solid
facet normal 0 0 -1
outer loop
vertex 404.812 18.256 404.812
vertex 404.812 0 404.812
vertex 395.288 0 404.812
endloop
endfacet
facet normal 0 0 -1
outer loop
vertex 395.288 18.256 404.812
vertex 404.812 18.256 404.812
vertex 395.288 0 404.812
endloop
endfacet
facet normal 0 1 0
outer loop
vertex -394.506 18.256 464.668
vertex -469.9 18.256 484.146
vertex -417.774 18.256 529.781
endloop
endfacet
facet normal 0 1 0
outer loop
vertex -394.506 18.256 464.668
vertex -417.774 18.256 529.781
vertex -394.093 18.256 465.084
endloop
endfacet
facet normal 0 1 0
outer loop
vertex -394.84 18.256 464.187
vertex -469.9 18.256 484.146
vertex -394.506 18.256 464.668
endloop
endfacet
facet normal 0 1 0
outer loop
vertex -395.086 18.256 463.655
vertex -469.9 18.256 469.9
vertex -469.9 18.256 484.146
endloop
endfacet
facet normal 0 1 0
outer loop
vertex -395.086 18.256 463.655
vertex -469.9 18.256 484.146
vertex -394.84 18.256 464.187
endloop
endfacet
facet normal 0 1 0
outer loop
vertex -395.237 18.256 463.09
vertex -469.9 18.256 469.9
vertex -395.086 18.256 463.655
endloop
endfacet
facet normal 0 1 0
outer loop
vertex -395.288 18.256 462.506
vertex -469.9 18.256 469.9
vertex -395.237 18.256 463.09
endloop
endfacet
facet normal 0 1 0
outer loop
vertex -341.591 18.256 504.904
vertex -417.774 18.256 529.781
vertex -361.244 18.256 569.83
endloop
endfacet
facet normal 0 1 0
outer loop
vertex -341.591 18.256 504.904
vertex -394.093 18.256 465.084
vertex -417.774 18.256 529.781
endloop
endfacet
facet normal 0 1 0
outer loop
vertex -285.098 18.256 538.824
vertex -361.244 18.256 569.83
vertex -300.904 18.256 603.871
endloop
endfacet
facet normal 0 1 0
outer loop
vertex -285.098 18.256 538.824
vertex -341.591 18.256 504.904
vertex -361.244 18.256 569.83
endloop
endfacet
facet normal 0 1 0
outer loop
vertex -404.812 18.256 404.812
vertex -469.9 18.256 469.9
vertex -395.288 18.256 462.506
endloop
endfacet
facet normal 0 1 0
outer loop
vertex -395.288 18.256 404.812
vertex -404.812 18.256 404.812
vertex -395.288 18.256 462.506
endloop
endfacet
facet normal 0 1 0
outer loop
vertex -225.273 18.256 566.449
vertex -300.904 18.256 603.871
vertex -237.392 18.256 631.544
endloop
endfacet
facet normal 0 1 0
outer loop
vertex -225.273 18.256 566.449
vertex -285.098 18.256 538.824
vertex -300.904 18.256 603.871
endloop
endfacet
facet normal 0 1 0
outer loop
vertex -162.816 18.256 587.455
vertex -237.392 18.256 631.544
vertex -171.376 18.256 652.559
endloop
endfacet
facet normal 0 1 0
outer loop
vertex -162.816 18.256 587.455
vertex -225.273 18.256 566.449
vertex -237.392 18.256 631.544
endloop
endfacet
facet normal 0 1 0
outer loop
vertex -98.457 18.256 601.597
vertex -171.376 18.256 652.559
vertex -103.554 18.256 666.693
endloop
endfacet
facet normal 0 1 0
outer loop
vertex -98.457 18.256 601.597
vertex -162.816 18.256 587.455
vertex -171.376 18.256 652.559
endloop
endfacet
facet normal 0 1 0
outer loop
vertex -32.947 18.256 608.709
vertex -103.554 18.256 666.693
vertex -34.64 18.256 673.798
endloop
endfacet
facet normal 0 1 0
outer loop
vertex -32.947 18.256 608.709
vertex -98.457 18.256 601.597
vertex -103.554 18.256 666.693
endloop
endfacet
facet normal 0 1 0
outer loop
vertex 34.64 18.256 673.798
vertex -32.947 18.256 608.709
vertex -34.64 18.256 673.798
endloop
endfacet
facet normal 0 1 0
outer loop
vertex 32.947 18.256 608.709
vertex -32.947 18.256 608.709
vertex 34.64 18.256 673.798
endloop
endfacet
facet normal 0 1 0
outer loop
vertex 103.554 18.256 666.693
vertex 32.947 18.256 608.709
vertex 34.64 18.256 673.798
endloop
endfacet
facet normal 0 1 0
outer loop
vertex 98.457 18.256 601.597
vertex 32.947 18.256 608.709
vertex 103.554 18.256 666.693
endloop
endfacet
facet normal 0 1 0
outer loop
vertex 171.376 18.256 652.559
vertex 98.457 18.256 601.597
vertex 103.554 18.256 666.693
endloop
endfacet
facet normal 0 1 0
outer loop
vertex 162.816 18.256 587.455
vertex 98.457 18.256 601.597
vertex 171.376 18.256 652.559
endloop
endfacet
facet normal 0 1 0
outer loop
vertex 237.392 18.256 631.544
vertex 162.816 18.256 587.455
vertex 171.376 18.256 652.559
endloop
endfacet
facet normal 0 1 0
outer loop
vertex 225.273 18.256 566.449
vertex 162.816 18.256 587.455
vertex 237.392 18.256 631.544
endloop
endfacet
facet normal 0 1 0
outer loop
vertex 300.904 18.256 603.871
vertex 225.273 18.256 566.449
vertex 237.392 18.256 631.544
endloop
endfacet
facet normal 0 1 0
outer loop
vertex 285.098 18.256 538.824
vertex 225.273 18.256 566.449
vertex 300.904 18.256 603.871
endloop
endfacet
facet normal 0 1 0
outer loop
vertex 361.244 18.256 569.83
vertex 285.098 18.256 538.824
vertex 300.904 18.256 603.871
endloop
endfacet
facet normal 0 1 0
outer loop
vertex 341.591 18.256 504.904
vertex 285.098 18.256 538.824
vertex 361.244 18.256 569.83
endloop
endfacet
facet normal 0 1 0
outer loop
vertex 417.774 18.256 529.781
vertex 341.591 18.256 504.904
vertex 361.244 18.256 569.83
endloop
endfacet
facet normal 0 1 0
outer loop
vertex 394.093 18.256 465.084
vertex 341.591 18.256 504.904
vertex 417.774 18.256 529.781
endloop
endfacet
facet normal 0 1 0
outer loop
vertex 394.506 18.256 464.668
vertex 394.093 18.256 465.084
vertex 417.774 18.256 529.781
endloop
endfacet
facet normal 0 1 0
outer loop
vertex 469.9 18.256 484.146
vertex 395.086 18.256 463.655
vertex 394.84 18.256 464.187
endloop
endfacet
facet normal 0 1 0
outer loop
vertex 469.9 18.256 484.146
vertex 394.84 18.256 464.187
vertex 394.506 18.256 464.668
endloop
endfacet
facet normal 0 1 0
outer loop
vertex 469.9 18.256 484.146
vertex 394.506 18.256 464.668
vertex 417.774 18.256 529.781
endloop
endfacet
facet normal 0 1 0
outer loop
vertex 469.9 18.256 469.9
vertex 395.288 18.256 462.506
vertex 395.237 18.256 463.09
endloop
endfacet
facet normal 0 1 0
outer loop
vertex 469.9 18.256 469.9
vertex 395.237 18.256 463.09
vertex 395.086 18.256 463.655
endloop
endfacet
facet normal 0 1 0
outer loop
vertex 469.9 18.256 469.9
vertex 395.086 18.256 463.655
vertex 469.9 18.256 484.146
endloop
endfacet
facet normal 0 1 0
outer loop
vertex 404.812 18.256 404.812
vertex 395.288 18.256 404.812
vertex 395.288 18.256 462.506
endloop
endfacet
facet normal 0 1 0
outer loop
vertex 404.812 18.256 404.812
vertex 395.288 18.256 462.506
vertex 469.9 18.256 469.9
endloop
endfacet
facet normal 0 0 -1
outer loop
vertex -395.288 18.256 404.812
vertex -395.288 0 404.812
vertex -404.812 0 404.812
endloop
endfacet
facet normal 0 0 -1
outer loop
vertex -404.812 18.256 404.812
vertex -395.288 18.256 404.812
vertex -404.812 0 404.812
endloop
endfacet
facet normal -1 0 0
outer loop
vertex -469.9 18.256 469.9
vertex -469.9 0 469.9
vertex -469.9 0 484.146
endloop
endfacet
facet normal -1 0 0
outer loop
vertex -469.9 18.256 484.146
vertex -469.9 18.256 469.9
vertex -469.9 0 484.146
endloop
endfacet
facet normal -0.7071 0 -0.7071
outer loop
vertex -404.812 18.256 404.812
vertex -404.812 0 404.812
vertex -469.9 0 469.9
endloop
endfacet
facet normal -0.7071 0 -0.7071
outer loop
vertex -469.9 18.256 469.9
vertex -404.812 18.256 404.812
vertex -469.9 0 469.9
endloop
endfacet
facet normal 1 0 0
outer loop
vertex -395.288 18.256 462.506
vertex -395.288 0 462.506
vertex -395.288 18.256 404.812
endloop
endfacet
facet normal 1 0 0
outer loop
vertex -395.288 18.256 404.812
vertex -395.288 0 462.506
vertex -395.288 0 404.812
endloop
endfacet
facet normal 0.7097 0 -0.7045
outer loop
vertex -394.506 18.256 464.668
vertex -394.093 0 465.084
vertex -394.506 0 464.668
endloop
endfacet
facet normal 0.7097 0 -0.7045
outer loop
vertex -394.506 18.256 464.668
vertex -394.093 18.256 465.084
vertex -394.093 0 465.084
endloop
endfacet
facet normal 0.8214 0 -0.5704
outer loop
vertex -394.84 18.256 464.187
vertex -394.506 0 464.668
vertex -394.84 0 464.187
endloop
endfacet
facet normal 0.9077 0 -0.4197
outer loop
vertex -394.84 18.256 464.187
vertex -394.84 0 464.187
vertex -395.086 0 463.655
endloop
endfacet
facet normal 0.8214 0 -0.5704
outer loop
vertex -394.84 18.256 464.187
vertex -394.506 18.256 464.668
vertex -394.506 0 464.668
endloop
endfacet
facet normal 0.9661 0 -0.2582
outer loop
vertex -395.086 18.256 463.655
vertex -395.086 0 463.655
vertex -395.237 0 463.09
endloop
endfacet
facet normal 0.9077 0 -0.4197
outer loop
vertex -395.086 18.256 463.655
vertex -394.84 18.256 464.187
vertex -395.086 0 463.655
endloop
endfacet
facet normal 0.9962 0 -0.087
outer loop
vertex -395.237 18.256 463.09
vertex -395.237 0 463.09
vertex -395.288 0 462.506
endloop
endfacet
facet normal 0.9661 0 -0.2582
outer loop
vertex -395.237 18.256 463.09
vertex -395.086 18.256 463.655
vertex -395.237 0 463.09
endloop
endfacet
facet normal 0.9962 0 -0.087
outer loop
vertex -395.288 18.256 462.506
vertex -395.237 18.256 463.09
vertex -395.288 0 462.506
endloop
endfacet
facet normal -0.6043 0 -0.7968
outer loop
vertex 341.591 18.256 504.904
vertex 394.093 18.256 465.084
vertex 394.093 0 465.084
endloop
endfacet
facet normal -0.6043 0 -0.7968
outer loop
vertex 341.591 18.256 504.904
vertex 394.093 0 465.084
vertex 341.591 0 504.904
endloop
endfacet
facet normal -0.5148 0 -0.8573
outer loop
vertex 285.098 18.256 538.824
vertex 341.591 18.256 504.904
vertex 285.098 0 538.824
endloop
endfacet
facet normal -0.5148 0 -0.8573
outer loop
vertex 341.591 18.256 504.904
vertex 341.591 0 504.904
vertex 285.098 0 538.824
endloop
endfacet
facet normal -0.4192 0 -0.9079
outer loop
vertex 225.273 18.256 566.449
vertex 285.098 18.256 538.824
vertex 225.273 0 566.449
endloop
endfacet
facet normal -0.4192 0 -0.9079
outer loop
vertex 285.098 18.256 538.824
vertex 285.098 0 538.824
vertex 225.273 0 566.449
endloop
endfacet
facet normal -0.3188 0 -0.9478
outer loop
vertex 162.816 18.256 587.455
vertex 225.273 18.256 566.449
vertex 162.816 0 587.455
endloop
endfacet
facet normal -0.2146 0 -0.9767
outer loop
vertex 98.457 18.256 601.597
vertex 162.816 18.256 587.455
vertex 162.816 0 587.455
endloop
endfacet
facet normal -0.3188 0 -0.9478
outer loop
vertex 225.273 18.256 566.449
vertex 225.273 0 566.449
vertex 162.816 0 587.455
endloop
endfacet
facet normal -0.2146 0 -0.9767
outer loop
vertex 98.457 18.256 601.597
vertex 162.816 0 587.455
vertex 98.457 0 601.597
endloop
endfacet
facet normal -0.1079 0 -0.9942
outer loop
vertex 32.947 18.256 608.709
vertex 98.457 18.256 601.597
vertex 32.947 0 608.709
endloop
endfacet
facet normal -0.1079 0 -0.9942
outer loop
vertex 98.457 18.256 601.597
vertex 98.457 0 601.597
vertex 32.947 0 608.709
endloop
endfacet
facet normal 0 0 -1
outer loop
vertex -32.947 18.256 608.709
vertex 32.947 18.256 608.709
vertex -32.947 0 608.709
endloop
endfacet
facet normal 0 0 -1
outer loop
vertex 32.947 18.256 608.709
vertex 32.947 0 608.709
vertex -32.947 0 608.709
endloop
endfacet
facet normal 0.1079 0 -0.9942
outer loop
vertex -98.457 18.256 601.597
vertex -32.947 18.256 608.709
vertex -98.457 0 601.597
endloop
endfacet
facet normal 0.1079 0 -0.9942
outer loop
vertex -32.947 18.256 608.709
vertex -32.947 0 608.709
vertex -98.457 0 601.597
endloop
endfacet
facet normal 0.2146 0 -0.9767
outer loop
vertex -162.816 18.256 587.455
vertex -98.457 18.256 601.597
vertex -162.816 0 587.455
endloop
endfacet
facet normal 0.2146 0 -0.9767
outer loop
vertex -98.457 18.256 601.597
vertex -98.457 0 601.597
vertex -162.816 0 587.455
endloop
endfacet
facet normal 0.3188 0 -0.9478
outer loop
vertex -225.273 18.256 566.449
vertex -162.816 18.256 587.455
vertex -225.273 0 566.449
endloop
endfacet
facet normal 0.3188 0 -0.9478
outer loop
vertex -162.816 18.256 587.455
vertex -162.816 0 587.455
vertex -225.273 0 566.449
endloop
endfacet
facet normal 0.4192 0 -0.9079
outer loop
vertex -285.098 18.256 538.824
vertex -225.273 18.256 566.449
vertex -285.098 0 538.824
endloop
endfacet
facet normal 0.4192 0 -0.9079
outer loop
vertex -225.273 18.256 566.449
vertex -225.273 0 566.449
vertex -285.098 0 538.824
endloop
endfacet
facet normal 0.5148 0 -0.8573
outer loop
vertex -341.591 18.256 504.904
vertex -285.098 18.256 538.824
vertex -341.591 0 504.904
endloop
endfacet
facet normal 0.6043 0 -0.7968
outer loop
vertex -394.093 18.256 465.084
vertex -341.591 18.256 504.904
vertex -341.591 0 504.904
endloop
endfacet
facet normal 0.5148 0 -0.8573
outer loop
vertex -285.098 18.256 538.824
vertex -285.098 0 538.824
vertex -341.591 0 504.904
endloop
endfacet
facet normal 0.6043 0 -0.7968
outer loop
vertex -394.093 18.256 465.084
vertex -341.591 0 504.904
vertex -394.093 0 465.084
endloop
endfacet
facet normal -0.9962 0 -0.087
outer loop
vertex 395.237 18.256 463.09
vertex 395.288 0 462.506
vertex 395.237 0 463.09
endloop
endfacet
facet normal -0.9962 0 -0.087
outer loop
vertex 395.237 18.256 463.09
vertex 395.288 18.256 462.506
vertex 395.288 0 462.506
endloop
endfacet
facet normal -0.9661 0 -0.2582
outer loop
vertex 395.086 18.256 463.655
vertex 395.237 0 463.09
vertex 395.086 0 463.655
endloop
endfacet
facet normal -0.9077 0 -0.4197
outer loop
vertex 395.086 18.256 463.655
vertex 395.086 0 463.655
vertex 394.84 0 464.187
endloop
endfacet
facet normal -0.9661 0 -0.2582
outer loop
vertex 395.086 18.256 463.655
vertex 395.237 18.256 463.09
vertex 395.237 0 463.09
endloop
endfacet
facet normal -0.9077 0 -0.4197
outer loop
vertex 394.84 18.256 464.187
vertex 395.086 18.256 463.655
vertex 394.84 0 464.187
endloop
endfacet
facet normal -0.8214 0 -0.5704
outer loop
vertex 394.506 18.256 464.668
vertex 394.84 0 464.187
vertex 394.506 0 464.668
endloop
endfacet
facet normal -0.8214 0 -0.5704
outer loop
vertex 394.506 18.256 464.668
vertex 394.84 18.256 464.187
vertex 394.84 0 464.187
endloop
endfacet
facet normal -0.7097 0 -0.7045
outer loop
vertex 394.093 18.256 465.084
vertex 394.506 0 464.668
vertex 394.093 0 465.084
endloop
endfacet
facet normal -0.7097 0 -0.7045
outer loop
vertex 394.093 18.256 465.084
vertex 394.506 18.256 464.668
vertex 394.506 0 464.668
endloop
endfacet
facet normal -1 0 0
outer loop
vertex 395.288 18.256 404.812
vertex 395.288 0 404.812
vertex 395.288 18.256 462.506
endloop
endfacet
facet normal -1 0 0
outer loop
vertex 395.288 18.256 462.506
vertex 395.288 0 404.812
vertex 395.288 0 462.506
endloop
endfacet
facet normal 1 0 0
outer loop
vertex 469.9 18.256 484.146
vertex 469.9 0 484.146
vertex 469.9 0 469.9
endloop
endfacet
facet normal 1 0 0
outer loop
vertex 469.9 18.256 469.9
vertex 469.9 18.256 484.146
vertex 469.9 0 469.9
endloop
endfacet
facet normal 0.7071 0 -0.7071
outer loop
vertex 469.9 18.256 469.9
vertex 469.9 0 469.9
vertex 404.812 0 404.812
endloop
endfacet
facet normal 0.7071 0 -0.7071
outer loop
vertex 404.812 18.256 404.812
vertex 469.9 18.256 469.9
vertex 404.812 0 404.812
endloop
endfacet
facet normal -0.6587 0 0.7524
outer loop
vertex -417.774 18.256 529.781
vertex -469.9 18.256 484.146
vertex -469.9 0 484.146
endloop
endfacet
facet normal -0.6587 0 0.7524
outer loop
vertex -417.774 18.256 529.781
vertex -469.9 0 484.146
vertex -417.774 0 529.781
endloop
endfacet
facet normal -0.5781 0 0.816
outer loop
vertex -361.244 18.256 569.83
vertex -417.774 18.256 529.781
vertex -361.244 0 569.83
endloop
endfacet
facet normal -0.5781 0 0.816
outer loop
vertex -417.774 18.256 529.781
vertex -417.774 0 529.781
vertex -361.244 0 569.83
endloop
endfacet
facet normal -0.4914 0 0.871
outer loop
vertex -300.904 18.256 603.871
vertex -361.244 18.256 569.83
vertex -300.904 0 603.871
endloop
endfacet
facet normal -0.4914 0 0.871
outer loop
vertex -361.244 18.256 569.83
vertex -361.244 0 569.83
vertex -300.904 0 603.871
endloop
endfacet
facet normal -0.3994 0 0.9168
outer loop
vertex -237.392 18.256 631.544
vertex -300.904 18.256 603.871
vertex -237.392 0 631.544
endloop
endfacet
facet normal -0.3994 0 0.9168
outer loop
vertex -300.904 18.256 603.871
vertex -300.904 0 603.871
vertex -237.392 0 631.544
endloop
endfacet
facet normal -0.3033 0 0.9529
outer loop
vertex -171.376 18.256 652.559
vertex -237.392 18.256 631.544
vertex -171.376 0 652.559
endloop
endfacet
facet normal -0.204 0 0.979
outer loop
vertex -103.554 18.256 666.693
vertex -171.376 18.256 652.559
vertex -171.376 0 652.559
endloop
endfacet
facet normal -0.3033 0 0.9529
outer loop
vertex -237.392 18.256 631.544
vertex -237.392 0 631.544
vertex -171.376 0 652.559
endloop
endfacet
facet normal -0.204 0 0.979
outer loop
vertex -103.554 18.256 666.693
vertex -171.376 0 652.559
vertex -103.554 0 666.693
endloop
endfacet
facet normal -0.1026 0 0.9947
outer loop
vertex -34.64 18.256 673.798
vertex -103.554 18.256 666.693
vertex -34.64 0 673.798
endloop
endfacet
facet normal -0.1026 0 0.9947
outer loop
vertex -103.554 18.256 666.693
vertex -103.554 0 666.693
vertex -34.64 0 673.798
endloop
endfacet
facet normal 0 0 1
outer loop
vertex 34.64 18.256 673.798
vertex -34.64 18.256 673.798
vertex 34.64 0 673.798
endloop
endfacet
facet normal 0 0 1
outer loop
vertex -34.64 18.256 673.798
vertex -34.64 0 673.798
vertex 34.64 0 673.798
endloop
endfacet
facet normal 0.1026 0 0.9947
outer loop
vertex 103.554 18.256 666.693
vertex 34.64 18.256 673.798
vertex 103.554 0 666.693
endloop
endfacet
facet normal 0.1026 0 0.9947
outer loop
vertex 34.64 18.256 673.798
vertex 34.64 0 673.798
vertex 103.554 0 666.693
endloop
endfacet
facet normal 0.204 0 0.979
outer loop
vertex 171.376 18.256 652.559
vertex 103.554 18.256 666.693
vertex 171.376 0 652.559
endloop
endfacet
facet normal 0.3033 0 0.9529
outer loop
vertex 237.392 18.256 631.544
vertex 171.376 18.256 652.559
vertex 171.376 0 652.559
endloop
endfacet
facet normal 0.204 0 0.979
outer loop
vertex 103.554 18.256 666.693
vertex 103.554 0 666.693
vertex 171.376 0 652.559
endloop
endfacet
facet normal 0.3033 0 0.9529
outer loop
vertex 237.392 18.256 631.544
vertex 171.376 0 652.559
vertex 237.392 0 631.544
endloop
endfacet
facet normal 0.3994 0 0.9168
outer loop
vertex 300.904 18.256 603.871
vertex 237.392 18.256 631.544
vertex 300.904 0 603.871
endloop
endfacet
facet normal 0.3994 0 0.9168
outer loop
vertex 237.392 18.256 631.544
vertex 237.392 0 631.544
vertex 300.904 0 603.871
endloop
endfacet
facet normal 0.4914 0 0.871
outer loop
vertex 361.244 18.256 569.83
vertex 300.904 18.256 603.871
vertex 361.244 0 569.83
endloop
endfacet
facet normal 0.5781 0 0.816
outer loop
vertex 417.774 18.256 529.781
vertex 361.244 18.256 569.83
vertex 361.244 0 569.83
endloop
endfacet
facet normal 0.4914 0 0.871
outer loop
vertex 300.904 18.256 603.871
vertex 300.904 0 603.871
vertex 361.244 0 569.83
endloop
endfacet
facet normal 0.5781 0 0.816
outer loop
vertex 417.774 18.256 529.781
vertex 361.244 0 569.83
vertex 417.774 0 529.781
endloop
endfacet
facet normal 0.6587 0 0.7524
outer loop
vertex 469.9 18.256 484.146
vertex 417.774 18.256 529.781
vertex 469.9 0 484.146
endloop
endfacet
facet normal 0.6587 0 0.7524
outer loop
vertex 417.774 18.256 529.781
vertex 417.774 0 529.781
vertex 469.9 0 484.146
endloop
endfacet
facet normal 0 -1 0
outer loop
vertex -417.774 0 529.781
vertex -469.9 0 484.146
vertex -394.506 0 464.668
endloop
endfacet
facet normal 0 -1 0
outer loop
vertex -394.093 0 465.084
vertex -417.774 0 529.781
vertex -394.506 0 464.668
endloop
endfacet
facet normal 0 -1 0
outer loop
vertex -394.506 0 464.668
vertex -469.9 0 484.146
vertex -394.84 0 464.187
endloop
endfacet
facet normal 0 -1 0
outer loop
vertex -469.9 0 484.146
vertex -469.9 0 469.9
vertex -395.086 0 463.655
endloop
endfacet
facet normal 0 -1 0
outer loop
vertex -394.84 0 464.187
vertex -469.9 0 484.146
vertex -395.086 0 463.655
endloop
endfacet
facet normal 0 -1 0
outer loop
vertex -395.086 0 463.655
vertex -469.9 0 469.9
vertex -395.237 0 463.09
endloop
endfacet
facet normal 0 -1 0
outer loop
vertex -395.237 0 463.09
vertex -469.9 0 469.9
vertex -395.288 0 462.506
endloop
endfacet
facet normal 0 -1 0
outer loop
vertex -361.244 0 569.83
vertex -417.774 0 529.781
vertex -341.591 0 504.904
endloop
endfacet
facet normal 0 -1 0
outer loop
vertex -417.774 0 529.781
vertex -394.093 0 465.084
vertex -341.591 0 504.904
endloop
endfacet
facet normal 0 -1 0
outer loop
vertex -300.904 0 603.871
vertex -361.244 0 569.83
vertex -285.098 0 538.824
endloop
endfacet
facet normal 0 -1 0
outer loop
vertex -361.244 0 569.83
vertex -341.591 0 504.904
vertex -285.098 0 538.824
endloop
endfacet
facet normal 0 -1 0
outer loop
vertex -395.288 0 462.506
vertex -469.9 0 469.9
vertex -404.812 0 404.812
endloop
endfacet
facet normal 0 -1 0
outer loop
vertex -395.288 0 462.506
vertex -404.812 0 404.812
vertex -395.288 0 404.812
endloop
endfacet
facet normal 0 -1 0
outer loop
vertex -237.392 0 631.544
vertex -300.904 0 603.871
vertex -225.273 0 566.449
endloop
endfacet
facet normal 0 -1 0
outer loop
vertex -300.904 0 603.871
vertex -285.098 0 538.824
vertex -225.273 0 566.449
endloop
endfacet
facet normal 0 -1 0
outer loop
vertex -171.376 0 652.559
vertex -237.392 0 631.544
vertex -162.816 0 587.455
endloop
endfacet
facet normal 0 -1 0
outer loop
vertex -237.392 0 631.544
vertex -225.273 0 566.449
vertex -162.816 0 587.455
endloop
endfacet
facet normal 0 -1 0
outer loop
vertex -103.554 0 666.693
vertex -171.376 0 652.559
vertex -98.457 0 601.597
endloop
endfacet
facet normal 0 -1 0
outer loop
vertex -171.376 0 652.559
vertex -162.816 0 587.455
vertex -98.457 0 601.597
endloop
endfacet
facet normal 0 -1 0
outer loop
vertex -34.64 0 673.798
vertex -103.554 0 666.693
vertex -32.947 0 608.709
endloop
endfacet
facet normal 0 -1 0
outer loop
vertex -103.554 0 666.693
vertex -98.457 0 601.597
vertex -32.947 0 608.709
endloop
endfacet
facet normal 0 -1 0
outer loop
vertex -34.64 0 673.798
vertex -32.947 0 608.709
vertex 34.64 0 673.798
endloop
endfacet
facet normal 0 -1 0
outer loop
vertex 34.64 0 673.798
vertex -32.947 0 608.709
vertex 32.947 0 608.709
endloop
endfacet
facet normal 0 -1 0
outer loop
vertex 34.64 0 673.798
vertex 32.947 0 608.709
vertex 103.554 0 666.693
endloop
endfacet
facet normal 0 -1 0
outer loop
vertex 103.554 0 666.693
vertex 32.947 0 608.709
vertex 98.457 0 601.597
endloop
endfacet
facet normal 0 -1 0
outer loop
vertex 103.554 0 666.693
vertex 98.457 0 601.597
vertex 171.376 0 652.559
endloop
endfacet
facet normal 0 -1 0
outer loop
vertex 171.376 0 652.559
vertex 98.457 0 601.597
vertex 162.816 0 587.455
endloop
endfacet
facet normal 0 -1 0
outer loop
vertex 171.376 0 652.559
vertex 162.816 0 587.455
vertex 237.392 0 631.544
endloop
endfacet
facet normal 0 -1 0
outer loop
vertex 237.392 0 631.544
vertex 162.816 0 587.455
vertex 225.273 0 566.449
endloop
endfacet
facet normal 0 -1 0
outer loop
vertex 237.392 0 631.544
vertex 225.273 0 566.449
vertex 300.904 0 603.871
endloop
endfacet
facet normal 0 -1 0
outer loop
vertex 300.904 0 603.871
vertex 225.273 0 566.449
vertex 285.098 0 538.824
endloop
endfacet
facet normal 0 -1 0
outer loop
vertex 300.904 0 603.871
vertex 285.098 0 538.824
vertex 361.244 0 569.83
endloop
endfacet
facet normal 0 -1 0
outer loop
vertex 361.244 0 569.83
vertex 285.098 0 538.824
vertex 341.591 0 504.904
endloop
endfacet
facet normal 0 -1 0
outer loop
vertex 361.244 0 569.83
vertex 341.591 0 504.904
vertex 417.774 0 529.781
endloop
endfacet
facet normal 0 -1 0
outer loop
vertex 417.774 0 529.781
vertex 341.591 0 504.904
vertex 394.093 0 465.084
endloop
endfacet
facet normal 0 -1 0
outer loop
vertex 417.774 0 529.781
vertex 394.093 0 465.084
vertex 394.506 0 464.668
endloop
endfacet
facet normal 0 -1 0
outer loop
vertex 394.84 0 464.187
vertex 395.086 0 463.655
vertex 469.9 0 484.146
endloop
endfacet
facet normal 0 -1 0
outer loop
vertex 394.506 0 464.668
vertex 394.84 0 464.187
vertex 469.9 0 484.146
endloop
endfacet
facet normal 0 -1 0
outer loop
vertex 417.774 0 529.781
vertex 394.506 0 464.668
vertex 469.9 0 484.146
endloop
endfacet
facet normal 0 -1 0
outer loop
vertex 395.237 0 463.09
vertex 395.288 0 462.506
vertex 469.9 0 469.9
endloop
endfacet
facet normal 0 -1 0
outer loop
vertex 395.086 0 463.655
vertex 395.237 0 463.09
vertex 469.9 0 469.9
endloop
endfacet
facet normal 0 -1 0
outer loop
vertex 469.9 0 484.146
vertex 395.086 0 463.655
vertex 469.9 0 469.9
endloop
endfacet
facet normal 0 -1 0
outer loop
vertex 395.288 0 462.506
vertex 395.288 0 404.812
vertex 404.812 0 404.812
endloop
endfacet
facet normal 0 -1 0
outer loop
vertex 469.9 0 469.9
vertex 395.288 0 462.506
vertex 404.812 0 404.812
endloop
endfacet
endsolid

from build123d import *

# Parameters (mm, degrees)
BOSS_EXTRUDE1_DEPTH = 18.25625
FILLET1_R           = 3.3782


with BuildPart() as part:
    # Sketch3 → Boss-Extrude1 (new body)
    with BuildSketch(Plane(origin=(0, 0, 0), x_dir=(1, 0, 0), z_dir=(0, 1, 0))):
        with BuildLine():
            Line((469.9, -484.145858865), (469.9, -469.9))
            Line((469.9, -469.9), (404.8125, -404.8125))
            Line((404.8125, -404.8125), (395.2875, -404.8125))
            Line((395.2875, -404.8125), (395.2875, -464.068909047))
            ThreePointArc((395.2875, -464.068909047), (0, -609.6), (-395.2875, -464.068909047))
            Line((-395.2875, -464.068909047), (-395.2875, -404.8125))
            Line((-395.2875, -404.8125), (-404.8125, -404.8125))
            Line((-404.8125, -404.8125), (-469.9, -469.9))
            Line((-469.9, -469.9), (-469.9, -484.145858865))
            ThreePointArc((-469.9, -484.145858865), (0, -674.6875), (469.9, -484.145858865))
        make_face()
    extrude(amount=BOSS_EXTRUDE1_DEPTH)

    # Fillet1
    fillet1_edges = [part.edges().sort_by_distance(p)[0] for p in [
        (-395.2875, 9.128125, 464.068909047),
        (395.2875, 9.128125, 464.068909047),
    ]]
    fillet(fillet1_edges, radius=FILLET1_R)


solid = part.part
